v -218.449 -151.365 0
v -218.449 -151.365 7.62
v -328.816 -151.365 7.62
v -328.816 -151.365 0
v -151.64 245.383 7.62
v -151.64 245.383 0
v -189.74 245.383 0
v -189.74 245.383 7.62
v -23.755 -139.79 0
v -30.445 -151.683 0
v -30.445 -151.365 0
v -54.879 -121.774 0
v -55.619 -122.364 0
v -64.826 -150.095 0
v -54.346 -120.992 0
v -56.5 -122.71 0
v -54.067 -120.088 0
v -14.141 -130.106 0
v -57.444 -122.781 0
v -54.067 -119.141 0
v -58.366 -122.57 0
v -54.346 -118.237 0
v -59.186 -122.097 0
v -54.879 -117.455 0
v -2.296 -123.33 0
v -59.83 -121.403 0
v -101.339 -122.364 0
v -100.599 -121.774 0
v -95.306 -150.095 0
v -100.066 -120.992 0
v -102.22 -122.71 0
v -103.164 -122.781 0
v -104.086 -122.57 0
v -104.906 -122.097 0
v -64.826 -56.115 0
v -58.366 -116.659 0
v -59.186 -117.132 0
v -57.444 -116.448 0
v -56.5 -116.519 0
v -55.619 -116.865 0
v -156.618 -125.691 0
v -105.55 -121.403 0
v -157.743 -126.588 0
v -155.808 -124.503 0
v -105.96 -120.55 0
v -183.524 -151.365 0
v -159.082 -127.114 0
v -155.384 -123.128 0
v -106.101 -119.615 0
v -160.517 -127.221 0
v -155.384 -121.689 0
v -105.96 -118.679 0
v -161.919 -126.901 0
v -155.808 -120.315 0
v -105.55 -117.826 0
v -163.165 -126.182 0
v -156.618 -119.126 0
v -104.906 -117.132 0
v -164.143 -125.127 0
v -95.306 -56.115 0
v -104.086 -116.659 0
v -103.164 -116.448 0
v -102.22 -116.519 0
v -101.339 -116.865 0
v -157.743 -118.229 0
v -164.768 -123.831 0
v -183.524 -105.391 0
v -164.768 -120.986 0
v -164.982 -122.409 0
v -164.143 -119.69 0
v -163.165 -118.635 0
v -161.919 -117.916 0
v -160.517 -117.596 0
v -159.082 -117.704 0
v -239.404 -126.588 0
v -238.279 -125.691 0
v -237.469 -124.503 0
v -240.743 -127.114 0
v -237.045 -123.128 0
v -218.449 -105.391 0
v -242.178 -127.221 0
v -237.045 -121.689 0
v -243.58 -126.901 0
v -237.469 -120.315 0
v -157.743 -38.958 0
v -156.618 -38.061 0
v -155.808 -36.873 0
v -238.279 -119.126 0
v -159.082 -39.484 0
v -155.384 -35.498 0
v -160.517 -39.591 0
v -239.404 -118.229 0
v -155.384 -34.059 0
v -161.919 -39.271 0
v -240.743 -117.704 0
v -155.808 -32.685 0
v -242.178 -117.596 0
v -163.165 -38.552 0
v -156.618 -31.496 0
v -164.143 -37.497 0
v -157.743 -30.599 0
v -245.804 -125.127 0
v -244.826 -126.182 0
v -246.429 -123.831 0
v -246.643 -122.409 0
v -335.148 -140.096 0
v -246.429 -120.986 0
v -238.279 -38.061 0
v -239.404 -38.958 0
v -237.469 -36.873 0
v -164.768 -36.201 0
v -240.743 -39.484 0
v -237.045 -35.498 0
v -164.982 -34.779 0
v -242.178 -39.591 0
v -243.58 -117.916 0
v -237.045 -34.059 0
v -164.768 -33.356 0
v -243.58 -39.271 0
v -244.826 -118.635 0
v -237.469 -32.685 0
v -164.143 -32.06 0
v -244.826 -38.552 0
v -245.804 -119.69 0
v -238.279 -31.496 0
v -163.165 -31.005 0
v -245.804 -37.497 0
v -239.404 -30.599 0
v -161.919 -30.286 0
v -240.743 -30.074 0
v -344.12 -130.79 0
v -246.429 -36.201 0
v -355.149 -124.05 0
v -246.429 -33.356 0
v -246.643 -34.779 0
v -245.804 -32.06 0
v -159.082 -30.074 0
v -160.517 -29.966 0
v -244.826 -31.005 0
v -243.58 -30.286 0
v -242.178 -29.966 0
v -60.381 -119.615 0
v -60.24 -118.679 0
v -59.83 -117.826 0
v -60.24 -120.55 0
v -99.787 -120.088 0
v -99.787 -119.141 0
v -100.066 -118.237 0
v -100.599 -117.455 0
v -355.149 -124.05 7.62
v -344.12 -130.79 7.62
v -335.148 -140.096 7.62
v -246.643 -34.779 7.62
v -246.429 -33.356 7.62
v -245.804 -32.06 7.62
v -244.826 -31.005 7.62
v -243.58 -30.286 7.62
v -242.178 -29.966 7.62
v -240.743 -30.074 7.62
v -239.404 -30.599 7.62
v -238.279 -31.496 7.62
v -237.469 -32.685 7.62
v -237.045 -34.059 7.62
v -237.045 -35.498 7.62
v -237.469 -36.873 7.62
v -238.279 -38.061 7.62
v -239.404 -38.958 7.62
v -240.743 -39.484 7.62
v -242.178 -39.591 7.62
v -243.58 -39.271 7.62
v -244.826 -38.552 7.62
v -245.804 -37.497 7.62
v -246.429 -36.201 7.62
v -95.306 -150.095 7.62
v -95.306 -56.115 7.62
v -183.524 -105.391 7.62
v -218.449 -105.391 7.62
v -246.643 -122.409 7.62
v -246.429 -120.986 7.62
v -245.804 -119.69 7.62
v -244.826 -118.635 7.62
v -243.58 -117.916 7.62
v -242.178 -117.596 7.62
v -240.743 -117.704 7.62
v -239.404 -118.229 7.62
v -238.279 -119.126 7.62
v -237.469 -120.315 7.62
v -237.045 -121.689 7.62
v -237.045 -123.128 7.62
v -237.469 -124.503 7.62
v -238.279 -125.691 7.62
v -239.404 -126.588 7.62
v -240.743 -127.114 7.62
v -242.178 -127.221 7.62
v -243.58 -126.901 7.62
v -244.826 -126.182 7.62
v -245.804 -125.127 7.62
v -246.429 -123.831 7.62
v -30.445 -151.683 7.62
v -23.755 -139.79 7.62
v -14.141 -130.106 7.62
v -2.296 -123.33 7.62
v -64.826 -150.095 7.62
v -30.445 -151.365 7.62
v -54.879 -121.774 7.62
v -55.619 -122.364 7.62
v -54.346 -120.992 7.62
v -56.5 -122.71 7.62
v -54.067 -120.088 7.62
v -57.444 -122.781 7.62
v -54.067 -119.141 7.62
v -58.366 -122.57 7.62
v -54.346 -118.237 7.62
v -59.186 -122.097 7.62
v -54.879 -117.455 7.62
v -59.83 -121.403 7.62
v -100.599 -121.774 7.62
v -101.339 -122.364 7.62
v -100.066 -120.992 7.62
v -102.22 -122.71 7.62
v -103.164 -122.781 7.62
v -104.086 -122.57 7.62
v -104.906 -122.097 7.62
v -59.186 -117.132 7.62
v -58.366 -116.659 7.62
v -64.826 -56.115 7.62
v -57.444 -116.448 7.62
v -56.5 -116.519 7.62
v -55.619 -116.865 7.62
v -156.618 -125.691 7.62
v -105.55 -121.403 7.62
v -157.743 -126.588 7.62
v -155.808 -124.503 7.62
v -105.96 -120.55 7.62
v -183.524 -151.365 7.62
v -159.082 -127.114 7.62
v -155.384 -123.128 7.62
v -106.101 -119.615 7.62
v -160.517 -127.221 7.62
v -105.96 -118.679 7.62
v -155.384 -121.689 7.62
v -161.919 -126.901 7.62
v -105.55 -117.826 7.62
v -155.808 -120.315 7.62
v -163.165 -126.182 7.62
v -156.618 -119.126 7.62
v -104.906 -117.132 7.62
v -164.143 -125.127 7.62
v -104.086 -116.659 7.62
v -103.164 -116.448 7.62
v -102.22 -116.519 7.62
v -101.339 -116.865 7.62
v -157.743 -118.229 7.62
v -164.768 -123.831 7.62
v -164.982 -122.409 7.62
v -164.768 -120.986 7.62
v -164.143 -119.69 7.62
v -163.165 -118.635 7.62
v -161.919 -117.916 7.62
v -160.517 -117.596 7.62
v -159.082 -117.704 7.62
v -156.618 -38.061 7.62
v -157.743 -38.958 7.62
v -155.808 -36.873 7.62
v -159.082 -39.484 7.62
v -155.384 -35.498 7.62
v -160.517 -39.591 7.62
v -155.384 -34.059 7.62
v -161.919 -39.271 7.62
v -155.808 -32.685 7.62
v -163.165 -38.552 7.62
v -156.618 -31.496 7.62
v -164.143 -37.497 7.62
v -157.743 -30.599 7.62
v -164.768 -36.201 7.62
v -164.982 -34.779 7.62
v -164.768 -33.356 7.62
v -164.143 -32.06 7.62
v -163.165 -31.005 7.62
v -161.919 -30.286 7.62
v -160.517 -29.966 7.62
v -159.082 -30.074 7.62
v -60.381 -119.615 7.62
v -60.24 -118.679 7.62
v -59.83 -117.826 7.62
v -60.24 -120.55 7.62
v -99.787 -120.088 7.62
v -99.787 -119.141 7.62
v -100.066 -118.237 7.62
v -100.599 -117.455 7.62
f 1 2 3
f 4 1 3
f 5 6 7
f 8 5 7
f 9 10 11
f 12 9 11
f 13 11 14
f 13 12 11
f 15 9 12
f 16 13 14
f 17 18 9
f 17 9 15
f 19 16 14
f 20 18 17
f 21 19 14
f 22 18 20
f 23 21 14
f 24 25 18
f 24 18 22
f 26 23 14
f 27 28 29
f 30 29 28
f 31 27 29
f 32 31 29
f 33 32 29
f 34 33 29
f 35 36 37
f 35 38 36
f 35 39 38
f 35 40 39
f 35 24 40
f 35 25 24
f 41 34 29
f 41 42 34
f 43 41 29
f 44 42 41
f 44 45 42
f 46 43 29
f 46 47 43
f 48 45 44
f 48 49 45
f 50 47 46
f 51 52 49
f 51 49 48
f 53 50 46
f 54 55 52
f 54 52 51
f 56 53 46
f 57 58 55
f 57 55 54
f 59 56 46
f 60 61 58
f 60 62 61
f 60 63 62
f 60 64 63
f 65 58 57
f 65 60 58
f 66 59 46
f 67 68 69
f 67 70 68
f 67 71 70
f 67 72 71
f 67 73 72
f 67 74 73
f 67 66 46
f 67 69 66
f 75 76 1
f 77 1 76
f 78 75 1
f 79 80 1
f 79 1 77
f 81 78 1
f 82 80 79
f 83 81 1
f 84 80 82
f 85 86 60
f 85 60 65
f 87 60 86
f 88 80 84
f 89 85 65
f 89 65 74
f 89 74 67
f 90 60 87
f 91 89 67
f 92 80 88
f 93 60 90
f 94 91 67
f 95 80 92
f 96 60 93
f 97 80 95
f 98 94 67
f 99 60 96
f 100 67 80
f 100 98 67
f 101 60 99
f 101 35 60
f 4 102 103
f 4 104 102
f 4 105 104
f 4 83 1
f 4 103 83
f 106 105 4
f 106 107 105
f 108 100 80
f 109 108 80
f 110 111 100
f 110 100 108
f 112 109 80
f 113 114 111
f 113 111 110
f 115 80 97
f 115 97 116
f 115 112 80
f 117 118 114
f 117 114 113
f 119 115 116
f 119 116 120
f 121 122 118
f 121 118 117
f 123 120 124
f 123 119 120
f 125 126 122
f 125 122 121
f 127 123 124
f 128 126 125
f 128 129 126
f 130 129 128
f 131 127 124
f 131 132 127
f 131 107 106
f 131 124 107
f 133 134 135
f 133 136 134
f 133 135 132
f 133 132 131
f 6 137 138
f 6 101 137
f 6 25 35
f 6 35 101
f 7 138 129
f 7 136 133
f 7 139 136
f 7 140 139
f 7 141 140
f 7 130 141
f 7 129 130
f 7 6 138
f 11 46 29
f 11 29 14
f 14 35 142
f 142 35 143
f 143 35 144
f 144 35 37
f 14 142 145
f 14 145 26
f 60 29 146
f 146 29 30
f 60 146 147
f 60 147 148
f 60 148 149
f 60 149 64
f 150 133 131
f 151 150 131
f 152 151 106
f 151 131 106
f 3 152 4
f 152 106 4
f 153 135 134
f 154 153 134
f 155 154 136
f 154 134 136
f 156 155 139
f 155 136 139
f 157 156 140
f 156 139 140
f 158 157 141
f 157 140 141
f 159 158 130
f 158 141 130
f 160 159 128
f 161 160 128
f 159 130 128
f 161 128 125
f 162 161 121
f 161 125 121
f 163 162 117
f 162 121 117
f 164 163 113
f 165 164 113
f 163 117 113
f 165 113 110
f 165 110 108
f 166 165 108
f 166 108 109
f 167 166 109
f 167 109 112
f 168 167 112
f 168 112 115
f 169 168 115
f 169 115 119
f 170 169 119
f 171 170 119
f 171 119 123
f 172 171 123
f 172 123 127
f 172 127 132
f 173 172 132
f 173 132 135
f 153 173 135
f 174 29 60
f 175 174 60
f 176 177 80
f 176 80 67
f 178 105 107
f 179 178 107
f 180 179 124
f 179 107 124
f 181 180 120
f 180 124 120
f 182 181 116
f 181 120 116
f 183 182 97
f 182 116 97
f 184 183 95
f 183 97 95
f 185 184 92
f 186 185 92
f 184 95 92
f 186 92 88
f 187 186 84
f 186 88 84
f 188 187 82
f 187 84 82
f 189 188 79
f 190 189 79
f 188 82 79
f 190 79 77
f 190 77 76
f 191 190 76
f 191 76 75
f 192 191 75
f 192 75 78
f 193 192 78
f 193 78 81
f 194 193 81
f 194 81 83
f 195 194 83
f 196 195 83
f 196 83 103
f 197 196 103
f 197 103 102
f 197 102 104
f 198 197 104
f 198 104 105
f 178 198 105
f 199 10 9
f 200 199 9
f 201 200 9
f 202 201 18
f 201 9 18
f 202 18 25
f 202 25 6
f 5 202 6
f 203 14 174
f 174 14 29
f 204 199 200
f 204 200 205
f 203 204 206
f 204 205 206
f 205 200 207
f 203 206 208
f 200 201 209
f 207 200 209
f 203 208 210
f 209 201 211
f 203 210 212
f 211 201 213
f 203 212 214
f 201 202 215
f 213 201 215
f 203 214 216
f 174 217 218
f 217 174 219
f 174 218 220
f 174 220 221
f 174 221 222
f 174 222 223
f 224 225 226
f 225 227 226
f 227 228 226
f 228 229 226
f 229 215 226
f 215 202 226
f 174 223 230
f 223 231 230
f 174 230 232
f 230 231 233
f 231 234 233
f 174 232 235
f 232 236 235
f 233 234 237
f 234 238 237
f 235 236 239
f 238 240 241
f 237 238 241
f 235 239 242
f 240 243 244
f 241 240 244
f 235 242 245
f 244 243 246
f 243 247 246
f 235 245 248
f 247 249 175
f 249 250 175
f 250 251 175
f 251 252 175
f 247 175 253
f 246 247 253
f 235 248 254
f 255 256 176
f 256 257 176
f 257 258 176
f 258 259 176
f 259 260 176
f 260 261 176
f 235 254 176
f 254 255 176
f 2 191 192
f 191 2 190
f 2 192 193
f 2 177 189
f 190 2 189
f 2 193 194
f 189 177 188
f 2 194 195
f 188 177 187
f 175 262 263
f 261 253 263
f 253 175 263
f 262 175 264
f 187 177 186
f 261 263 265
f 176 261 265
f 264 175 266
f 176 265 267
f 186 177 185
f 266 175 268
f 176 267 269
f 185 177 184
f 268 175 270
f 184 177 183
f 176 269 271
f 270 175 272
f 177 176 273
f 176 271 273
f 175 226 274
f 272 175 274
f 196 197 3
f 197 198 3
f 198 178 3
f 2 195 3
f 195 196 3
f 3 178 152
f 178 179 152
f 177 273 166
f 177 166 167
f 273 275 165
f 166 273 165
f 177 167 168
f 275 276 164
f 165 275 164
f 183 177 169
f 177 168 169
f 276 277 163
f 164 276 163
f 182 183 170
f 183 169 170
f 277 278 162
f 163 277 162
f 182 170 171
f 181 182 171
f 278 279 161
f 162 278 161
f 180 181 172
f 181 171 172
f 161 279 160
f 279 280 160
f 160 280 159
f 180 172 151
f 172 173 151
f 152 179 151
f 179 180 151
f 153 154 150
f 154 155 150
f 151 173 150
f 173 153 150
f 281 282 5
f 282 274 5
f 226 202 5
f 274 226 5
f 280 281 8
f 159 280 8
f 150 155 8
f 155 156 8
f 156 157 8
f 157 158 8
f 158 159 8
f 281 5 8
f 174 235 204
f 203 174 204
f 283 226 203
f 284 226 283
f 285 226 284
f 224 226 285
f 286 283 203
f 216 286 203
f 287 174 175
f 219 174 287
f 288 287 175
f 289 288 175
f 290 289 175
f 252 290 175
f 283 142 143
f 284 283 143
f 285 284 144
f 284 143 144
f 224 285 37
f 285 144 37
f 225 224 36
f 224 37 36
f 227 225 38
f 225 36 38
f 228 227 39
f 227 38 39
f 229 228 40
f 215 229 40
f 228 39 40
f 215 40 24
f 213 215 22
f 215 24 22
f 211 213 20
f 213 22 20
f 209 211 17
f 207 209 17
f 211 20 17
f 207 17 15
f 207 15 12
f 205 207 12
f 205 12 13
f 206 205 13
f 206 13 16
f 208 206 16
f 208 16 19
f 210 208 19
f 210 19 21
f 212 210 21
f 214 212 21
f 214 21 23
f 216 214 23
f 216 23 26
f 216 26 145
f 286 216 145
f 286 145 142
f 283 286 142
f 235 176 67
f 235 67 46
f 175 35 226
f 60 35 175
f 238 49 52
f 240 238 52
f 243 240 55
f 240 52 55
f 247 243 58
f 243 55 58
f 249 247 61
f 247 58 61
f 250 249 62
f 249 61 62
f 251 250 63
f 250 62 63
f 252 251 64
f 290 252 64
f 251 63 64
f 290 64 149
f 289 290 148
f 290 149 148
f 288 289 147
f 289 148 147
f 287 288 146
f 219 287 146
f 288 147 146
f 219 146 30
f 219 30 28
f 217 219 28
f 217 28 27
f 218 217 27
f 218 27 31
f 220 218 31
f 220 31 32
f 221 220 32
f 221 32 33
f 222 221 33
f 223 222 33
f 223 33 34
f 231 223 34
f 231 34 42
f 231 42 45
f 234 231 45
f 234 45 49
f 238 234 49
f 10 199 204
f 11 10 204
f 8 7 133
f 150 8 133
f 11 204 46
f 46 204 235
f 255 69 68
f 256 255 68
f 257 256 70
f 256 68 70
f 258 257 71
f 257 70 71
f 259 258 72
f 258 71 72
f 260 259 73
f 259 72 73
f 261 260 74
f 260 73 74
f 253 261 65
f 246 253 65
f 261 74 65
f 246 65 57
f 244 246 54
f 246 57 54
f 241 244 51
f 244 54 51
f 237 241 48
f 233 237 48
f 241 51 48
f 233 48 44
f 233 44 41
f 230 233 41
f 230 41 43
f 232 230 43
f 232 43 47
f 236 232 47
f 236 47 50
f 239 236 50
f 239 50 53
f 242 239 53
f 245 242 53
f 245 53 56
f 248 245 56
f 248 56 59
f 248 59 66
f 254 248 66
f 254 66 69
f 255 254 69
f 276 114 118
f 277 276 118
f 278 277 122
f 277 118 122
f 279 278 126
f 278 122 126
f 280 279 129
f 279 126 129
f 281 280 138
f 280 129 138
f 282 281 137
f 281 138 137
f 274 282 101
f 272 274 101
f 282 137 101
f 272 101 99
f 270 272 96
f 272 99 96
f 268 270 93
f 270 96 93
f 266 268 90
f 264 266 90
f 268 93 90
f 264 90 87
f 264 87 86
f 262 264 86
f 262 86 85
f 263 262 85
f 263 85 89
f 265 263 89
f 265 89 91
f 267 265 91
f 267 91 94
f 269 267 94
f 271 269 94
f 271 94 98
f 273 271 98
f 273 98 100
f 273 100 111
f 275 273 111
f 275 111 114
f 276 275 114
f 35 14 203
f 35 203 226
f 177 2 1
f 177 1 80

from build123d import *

# Parameters (mm, degrees)
BOSS_EXTRUDE1_DEPTH     = 7.62
SKETCH5_R               = 15.875
CUT_EXTRUDE2_DEPTH      = 50.8
SKETCH6_R               = 15.875
CUT_EXTRUDE3_DEPTH      = 50.8
CUT_EXTRUDE4_DEPTH      = 444.557362906
CUT_EXTRUDE4_DEPTH_BACK = 7.62
CUT_EXTRUDE6_REACH      = 445.557
SKETCH9_R               = 4.826
SKETCH10_W              = 30.48
SKETCH10_H              = 114.3
CUT_EXTRUDE12_DEPTH     = 25.4
CUT_EXTRUDE14_REACH     = 445.557
SKETCH14_R              = 50.8
CUT_EXTRUDE15_REACH     = 445.557
SKETCH15_R              = 50.8
SKETCH16_W              = 30.48
SKETCH16_H              = 20.32
BOSS_EXTRUDE2_DEPTH     = 7.62
CUT_EXTRUDE16_REACH     = 433.743
SKETCH17_R              = 3.175
CUT_EXTRUDE17_START     = -7.62
SKETCH18_W              = 300.609514784
SKETCH18_H              = 19.05
CUT_EXTRUDE17_DEPTH     = 7.62
CUT_EXTRUDE18_REACH     = 433.743
SKETCH19_R              = 4.826


with BuildPart() as part:
    # Sketch2 → Boss-Extrude1 (new body)
    with BuildSketch(Plane.XY):
        Polygon((-189.740054039, 245.383385713), (-375.90852523, -170.414614287), (16.77547477, -170.414614287), (-151.640054039, 245.383385713), align=None)
    extrude(amount=BOSS_EXTRUDE1_DEPTH)

    # Sketch5 → Cut-Extrude2 (cut)
    with BuildSketch(Plane(origin=(0, 0, 0), x_dir=(-1, 0, 0), z_dir=(0, 0, -1))):
        with Locations((375.90852523, -170.414614287)):
            Circle(SKETCH5_R)
    extrude(amount=-CUT_EXTRUDE2_DEPTH, mode=Mode.SUBTRACT)

    # Sketch6 → Cut-Extrude3 (cut)
    with BuildSketch(Plane(origin=(0, 0, 0), x_dir=(-1, 0, 0), z_dir=(0, 0, -1))):
        with Locations((-16.77547477, -170.414614287)):
            Circle(SKETCH6_R)
    extrude(amount=-CUT_EXTRUDE3_DEPTH, mode=Mode.SUBTRACT)

    # Sketch8 → Cut-Extrude4 (cut, two sides: drawn at the far end of the back side and taken through both)
    with BuildSketch(Plane(origin=(0, 0, 0), x_dir=(-1, 0, 0), z_dir=(0, 0, -1)).offset(-CUT_EXTRUDE4_DEPTH_BACK)):
        Polygon((218.448947474, -1130.046710402), (218.448947474, -170.414614287), (218.448947474, -105.390614287), (183.523947474, -105.390614287), (183.523947474, -170.414614287), (183.523947474, -1130.046710402), (183.523947474, -3049.310902633), (218.448947474, -3049.310902633), align=None)
    extrude(amount=CUT_EXTRUDE4_DEPTH + CUT_EXTRUDE4_DEPTH_BACK, mode=Mode.SUBTRACT)

    # Sketch9 → Cut-Extrude6 (cut, up to next)
    with BuildSketch(Plane(origin=(0, 0, 0), x_dir=(-1, 0, 0), z_dir=(0, 0, -1)), mode=Mode.PRIVATE) as cut_extrude6_sk1:
        with Locations((160.155947474, -122.408614287)):
            Circle(SKETCH9_R)
    cut_extrude6_tool1 = extrude(cut_extrude6_sk1.sketch, amount=-CUT_EXTRUDE6_REACH, mode=Mode.PRIVATE) & part.part
    # Sketch9 → Cut-Extrude6 (cut, up to next)
    with BuildSketch(Plane(origin=(0, 0, 0), x_dir=(-1, 0, 0), z_dir=(0, 0, -1)), mode=Mode.PRIVATE) as cut_extrude6_sk2:
        with Locations((241.816947474, -122.408614287)):
            Circle(SKETCH9_R)
    cut_extrude6_tool2 = extrude(cut_extrude6_sk2.sketch, amount=-CUT_EXTRUDE6_REACH, mode=Mode.PRIVATE) & part.part
    add(cut_extrude6_tool1.solids().sort_by_distance((-160.155947, -122.408614, 0))[0], mode=Mode.SUBTRACT)
    add(cut_extrude6_tool2.solids().sort_by_distance((-241.816947, -122.408614, 0))[0], mode=Mode.SUBTRACT)

    # Sketch10 → Cut-Extrude12 (cut)
    with BuildSketch(Plane(origin=(0, 0, 0), x_dir=(-1, 0, 0), z_dir=(0, 0, -1))):
        with Locations((80.066257047, -113.264614287)):
            Rectangle(SKETCH10_W, SKETCH10_H)
    extrude(amount=-CUT_EXTRUDE12_DEPTH, mode=Mode.SUBTRACT)

    # Sketch14 → Cut-Extrude14 (cut, up to next)
    with BuildSketch(Plane(origin=(0, 0, 0), x_dir=(-1, 0, 0), z_dir=(0, 0, -1)), mode=Mode.PRIVATE) as cut_extrude14_sk1:
        with Locations((-16.77547477, -170.414614287)):
            Circle(SKETCH14_R)
    cut_extrude14_tool1 = extrude(cut_extrude14_sk1.sketch, amount=-CUT_EXTRUDE14_REACH, mode=Mode.PRIVATE) & part.part
    add(cut_extrude14_tool1.solids().sort_by_distance((16.775475, -170.414614, 0))[0], mode=Mode.SUBTRACT)

    # Sketch15 → Cut-Extrude15 (cut, up to next)
    with BuildSketch(Plane(origin=(0, 0, 0), x_dir=(-1, 0, 0), z_dir=(0, 0, -1)), mode=Mode.PRIVATE) as cut_extrude15_sk1:
        with Locations((375.90852523, -170.414614287)):
            Circle(SKETCH15_R)
    cut_extrude15_tool1 = extrude(cut_extrude15_sk1.sketch, amount=-CUT_EXTRUDE15_REACH, mode=Mode.PRIVATE) & part.part
    add(cut_extrude15_tool1.solids().sort_by_distance((-375.908525, -170.414614, 0))[0], mode=Mode.SUBTRACT)

    # Sketch16 → Boss-Extrude2 (add)
    with BuildSketch(Plane(origin=(0, 0, 0), x_dir=(-1, 0, 0), z_dir=(0, 0, -1))):
        with Locations((80.066257047, -160.254614287)):
            Rectangle(SKETCH16_W, SKETCH16_H)
    extrude(amount=-BOSS_EXTRUDE2_DEPTH)

    # Sketch17 → Cut-Extrude16 (cut, up to next)
    with BuildSketch(Plane(origin=(0, 0, 0), x_dir=(-1, 0, 0), z_dir=(0, 0, -1)), mode=Mode.PRIVATE) as cut_extrude16_sk1:
        with Locations((57.206257047, -119.614614287)):
            Circle(SKETCH17_R)
    cut_extrude16_tool1 = extrude(cut_extrude16_sk1.sketch, amount=-CUT_EXTRUDE16_REACH, mode=Mode.PRIVATE) & part.part
    # Sketch17 → Cut-Extrude16 (cut, up to next)
    with BuildSketch(Plane(origin=(0, 0, 0), x_dir=(-1, 0, 0), z_dir=(0, 0, -1)), mode=Mode.PRIVATE) as cut_extrude16_sk2:
        with Locations((102.926257047, -119.614614287)):
            Circle(SKETCH17_R)
    cut_extrude16_tool2 = extrude(cut_extrude16_sk2.sketch, amount=-CUT_EXTRUDE16_REACH, mode=Mode.PRIVATE) & part.part
    add(cut_extrude16_tool1.solids().sort_by_distance((-57.206257, -119.614614, 0))[0], mode=Mode.SUBTRACT)
    add(cut_extrude16_tool2.solids().sort_by_distance((-102.926257, -119.614614, 0))[0], mode=Mode.SUBTRACT)

    # Sketch18 → Cut-Extrude17 (cut)
    with BuildSketch(Plane(origin=(0, 0, 0), x_dir=(-1, 0, 0), z_dir=(0, 0, -1)).offset(CUT_EXTRUDE17_START)):
        with Locations((180.749872138, -160.889614287)):
            Rectangle(SKETCH18_W, SKETCH18_H)
    extrude(amount=CUT_EXTRUDE17_DEPTH, mode=Mode.SUBTRACT)

    # Sketch19 → Cut-Extrude18 (cut, up to next)
    with BuildSketch(Plane(origin=(0, 0, 0), x_dir=(-1, 0, 0), z_dir=(0, 0, -1)), mode=Mode.PRIVATE) as cut_extrude18_sk1:
        with Locations((241.816947474, -34.778614287)):
            Circle(SKETCH19_R)
    cut_extrude18_tool1 = extrude(cut_extrude18_sk1.sketch, amount=-CUT_EXTRUDE18_REACH, mode=Mode.PRIVATE) & part.part
    # Sketch19 → Cut-Extrude18 (cut, up to next)
    with BuildSketch(Plane(origin=(0, 0, 0), x_dir=(-1, 0, 0), z_dir=(0, 0, -1)), mode=Mode.PRIVATE) as cut_extrude18_sk2:
        with Locations((160.155947474, -34.778614287)):
            Circle(SKETCH19_R)
    cut_extrude18_tool2 = extrude(cut_extrude18_sk2.sketch, amount=-CUT_EXTRUDE18_REACH, mode=Mode.PRIVATE) & part.part
    add(cut_extrude18_tool1.solids().sort_by_distance((-241.816947, -34.778614, 0))[0], mode=Mode.SUBTRACT)
    add(cut_extrude18_tool2.solids().sort_by_distance((-160.155947, -34.778614, 0))[0], mode=Mode.SUBTRACT)


solid = part.part
